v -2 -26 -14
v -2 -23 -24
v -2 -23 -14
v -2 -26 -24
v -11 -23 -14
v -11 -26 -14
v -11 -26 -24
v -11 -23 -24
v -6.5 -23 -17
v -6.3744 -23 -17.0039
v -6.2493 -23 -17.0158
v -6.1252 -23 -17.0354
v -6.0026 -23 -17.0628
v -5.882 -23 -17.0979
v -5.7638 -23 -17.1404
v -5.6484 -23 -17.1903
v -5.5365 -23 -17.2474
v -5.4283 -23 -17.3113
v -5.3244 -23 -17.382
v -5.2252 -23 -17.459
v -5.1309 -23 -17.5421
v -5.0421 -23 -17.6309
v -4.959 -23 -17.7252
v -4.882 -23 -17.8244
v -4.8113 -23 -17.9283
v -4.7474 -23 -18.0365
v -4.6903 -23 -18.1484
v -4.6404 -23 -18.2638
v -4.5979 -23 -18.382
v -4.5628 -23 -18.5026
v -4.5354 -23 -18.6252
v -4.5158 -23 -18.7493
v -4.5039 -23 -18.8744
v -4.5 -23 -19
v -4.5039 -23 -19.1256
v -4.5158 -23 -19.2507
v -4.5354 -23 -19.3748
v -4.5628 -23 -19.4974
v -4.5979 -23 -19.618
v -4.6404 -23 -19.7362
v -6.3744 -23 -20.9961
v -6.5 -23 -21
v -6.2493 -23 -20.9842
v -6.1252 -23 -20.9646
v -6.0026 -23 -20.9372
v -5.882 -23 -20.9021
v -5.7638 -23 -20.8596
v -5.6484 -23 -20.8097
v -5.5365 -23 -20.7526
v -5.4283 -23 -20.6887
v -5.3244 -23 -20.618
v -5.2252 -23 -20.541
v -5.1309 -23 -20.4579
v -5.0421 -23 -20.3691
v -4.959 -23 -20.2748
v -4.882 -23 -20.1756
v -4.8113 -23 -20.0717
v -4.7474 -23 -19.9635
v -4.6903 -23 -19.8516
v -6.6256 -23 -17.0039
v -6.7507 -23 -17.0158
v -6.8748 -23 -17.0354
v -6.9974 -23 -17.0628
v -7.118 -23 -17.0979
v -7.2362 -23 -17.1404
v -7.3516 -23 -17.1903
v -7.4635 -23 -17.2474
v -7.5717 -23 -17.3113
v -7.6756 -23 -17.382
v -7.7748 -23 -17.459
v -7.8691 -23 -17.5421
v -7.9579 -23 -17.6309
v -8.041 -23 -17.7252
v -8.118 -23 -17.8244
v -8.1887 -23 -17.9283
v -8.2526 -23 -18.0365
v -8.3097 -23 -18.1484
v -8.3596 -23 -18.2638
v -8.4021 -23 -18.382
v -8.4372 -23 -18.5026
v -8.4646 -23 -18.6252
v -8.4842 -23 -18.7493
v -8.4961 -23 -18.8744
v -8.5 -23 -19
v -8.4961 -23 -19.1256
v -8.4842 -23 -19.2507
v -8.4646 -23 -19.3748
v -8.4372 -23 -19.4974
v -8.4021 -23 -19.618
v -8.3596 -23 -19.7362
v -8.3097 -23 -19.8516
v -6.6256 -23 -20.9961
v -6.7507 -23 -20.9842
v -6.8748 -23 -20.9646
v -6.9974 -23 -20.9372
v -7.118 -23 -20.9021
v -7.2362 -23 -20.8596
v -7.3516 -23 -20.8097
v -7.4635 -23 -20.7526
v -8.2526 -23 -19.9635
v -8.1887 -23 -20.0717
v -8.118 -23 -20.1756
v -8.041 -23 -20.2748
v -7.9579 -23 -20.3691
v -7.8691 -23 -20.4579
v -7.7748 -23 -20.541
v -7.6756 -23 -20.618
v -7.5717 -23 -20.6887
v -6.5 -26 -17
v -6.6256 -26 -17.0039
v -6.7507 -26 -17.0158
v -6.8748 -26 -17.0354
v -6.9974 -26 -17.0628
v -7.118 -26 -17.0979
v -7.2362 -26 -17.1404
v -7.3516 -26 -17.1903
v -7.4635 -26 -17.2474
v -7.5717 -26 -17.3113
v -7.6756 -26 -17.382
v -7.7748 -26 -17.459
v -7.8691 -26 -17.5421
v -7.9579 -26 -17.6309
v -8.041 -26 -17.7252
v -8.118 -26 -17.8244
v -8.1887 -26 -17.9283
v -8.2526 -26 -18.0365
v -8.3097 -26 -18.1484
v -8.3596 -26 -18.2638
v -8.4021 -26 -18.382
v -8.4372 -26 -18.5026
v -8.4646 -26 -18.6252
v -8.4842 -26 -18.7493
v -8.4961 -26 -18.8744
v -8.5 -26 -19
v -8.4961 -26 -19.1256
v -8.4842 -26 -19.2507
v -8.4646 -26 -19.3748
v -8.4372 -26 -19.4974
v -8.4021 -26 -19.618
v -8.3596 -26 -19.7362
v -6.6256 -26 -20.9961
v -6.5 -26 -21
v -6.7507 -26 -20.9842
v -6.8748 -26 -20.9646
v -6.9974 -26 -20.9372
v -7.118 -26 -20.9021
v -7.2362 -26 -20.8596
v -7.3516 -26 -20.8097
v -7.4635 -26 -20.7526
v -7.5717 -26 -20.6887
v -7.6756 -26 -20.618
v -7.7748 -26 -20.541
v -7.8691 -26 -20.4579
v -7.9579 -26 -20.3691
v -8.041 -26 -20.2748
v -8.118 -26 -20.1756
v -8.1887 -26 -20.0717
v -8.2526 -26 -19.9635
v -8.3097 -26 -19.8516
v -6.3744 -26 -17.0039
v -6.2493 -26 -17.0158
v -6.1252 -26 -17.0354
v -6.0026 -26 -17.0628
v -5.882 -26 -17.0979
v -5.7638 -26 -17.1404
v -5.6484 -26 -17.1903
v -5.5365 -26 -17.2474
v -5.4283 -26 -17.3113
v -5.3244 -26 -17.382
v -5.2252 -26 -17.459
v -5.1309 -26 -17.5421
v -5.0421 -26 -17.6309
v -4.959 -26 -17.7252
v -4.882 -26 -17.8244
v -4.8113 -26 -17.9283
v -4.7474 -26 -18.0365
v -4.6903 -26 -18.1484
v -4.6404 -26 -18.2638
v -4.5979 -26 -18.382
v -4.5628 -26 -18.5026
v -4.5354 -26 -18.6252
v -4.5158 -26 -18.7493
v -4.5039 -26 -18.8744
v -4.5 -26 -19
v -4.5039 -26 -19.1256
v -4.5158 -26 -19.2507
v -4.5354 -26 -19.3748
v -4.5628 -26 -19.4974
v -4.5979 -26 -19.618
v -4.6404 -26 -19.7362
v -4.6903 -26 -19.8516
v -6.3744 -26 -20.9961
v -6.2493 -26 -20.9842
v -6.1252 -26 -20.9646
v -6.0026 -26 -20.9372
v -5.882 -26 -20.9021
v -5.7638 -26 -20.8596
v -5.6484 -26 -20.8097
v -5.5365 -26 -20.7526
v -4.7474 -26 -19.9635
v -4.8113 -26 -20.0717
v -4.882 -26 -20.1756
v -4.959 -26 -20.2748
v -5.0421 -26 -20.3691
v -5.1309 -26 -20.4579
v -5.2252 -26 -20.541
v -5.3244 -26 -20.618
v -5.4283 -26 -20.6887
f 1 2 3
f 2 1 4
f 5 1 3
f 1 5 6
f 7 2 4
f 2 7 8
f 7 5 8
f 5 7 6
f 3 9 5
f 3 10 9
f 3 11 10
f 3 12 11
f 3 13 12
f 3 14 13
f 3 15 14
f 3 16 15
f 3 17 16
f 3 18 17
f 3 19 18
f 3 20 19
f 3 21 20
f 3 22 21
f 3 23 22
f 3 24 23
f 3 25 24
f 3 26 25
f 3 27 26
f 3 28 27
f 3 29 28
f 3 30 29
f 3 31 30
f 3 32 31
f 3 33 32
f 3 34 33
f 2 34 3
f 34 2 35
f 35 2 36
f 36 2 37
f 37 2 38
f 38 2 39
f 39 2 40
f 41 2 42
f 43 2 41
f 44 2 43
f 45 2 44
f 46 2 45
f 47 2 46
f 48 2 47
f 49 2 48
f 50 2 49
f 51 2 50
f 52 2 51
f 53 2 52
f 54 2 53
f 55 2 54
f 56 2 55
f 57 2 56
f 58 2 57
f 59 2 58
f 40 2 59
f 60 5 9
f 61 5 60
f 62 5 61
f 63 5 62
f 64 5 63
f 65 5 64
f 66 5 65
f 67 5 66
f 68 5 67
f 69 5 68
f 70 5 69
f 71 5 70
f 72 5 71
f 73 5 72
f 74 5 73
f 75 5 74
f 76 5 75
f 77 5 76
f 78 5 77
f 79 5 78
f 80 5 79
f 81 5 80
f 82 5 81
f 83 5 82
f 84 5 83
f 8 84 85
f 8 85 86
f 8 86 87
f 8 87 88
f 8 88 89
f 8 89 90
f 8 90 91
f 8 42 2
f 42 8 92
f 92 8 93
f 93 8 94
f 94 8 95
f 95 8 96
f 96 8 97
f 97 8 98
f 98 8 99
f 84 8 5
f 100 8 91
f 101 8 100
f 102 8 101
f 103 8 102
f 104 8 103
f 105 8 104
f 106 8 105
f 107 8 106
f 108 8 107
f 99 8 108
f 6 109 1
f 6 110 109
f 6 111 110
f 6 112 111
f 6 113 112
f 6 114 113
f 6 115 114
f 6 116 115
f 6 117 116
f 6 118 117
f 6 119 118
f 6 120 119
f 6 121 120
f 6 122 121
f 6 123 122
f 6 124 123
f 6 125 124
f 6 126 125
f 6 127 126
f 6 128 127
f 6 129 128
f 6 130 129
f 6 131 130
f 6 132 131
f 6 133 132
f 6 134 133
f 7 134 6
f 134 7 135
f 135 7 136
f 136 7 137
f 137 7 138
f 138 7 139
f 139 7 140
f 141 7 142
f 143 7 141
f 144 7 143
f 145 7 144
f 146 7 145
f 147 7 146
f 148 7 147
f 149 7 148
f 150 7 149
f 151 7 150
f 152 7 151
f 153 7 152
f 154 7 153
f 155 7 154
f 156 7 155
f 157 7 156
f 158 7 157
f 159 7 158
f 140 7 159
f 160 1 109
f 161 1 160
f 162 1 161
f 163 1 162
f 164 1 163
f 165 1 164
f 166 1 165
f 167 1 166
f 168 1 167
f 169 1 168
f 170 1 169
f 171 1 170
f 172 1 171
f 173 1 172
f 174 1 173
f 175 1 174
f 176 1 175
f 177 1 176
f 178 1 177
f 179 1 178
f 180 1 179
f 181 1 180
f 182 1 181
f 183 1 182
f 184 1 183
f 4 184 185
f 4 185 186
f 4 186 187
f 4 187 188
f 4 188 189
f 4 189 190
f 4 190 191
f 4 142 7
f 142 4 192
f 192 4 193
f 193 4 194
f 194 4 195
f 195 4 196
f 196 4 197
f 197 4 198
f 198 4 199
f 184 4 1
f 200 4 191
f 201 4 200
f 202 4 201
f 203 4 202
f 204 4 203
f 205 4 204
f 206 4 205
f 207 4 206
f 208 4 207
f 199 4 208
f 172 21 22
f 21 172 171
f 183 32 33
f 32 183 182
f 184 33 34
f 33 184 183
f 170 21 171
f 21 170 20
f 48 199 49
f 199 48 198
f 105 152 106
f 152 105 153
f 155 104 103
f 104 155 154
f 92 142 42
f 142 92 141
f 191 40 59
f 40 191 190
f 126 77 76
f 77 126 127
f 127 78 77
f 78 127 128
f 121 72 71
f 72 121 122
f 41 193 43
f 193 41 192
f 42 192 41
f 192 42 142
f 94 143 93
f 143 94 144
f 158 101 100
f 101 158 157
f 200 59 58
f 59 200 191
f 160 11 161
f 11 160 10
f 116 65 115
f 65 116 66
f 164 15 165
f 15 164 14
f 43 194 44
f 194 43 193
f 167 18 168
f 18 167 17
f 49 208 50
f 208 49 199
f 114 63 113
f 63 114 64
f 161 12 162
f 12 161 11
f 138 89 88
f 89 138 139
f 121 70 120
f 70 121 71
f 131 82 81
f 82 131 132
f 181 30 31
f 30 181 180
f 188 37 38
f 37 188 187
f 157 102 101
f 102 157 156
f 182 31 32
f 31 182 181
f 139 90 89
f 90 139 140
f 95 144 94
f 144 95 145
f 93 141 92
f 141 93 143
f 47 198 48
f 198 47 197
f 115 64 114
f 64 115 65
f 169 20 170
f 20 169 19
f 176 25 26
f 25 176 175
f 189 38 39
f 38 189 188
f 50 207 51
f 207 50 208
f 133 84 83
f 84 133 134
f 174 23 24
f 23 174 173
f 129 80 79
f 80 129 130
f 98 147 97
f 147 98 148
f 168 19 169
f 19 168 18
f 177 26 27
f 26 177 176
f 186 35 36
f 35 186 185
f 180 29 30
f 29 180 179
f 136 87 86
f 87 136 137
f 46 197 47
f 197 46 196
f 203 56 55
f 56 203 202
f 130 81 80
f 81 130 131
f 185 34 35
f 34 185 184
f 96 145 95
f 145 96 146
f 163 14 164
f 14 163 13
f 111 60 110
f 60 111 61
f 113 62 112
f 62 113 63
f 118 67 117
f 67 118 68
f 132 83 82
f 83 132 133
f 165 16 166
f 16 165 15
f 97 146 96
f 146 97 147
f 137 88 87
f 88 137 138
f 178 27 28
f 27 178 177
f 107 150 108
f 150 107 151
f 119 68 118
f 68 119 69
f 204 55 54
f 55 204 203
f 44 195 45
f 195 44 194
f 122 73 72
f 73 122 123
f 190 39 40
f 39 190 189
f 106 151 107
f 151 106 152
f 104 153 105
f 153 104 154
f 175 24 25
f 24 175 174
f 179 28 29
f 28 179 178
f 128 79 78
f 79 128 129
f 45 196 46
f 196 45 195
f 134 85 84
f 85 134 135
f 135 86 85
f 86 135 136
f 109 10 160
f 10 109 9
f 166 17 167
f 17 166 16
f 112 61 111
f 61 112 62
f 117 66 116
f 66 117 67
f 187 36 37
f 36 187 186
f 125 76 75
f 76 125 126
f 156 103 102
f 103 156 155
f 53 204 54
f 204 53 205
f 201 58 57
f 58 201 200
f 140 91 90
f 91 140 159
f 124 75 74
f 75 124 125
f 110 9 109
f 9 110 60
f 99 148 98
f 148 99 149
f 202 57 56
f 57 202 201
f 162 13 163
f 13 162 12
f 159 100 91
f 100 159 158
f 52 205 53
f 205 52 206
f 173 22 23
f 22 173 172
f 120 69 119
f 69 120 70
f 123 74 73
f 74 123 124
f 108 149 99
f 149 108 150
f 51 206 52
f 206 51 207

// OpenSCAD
difference(){
	union(){

        
        translate([3-5-9,-26,-24+0]){
            cube([9,3,10], center=false);
        }         
        


        


	}
	union() {
       
        translate([-6.5,8.5,-19]){
            rotate([90,0,0]){
                cylinder(h=125, r=2, $fn=100, center=false);
            }
        }         
         



	}
}
